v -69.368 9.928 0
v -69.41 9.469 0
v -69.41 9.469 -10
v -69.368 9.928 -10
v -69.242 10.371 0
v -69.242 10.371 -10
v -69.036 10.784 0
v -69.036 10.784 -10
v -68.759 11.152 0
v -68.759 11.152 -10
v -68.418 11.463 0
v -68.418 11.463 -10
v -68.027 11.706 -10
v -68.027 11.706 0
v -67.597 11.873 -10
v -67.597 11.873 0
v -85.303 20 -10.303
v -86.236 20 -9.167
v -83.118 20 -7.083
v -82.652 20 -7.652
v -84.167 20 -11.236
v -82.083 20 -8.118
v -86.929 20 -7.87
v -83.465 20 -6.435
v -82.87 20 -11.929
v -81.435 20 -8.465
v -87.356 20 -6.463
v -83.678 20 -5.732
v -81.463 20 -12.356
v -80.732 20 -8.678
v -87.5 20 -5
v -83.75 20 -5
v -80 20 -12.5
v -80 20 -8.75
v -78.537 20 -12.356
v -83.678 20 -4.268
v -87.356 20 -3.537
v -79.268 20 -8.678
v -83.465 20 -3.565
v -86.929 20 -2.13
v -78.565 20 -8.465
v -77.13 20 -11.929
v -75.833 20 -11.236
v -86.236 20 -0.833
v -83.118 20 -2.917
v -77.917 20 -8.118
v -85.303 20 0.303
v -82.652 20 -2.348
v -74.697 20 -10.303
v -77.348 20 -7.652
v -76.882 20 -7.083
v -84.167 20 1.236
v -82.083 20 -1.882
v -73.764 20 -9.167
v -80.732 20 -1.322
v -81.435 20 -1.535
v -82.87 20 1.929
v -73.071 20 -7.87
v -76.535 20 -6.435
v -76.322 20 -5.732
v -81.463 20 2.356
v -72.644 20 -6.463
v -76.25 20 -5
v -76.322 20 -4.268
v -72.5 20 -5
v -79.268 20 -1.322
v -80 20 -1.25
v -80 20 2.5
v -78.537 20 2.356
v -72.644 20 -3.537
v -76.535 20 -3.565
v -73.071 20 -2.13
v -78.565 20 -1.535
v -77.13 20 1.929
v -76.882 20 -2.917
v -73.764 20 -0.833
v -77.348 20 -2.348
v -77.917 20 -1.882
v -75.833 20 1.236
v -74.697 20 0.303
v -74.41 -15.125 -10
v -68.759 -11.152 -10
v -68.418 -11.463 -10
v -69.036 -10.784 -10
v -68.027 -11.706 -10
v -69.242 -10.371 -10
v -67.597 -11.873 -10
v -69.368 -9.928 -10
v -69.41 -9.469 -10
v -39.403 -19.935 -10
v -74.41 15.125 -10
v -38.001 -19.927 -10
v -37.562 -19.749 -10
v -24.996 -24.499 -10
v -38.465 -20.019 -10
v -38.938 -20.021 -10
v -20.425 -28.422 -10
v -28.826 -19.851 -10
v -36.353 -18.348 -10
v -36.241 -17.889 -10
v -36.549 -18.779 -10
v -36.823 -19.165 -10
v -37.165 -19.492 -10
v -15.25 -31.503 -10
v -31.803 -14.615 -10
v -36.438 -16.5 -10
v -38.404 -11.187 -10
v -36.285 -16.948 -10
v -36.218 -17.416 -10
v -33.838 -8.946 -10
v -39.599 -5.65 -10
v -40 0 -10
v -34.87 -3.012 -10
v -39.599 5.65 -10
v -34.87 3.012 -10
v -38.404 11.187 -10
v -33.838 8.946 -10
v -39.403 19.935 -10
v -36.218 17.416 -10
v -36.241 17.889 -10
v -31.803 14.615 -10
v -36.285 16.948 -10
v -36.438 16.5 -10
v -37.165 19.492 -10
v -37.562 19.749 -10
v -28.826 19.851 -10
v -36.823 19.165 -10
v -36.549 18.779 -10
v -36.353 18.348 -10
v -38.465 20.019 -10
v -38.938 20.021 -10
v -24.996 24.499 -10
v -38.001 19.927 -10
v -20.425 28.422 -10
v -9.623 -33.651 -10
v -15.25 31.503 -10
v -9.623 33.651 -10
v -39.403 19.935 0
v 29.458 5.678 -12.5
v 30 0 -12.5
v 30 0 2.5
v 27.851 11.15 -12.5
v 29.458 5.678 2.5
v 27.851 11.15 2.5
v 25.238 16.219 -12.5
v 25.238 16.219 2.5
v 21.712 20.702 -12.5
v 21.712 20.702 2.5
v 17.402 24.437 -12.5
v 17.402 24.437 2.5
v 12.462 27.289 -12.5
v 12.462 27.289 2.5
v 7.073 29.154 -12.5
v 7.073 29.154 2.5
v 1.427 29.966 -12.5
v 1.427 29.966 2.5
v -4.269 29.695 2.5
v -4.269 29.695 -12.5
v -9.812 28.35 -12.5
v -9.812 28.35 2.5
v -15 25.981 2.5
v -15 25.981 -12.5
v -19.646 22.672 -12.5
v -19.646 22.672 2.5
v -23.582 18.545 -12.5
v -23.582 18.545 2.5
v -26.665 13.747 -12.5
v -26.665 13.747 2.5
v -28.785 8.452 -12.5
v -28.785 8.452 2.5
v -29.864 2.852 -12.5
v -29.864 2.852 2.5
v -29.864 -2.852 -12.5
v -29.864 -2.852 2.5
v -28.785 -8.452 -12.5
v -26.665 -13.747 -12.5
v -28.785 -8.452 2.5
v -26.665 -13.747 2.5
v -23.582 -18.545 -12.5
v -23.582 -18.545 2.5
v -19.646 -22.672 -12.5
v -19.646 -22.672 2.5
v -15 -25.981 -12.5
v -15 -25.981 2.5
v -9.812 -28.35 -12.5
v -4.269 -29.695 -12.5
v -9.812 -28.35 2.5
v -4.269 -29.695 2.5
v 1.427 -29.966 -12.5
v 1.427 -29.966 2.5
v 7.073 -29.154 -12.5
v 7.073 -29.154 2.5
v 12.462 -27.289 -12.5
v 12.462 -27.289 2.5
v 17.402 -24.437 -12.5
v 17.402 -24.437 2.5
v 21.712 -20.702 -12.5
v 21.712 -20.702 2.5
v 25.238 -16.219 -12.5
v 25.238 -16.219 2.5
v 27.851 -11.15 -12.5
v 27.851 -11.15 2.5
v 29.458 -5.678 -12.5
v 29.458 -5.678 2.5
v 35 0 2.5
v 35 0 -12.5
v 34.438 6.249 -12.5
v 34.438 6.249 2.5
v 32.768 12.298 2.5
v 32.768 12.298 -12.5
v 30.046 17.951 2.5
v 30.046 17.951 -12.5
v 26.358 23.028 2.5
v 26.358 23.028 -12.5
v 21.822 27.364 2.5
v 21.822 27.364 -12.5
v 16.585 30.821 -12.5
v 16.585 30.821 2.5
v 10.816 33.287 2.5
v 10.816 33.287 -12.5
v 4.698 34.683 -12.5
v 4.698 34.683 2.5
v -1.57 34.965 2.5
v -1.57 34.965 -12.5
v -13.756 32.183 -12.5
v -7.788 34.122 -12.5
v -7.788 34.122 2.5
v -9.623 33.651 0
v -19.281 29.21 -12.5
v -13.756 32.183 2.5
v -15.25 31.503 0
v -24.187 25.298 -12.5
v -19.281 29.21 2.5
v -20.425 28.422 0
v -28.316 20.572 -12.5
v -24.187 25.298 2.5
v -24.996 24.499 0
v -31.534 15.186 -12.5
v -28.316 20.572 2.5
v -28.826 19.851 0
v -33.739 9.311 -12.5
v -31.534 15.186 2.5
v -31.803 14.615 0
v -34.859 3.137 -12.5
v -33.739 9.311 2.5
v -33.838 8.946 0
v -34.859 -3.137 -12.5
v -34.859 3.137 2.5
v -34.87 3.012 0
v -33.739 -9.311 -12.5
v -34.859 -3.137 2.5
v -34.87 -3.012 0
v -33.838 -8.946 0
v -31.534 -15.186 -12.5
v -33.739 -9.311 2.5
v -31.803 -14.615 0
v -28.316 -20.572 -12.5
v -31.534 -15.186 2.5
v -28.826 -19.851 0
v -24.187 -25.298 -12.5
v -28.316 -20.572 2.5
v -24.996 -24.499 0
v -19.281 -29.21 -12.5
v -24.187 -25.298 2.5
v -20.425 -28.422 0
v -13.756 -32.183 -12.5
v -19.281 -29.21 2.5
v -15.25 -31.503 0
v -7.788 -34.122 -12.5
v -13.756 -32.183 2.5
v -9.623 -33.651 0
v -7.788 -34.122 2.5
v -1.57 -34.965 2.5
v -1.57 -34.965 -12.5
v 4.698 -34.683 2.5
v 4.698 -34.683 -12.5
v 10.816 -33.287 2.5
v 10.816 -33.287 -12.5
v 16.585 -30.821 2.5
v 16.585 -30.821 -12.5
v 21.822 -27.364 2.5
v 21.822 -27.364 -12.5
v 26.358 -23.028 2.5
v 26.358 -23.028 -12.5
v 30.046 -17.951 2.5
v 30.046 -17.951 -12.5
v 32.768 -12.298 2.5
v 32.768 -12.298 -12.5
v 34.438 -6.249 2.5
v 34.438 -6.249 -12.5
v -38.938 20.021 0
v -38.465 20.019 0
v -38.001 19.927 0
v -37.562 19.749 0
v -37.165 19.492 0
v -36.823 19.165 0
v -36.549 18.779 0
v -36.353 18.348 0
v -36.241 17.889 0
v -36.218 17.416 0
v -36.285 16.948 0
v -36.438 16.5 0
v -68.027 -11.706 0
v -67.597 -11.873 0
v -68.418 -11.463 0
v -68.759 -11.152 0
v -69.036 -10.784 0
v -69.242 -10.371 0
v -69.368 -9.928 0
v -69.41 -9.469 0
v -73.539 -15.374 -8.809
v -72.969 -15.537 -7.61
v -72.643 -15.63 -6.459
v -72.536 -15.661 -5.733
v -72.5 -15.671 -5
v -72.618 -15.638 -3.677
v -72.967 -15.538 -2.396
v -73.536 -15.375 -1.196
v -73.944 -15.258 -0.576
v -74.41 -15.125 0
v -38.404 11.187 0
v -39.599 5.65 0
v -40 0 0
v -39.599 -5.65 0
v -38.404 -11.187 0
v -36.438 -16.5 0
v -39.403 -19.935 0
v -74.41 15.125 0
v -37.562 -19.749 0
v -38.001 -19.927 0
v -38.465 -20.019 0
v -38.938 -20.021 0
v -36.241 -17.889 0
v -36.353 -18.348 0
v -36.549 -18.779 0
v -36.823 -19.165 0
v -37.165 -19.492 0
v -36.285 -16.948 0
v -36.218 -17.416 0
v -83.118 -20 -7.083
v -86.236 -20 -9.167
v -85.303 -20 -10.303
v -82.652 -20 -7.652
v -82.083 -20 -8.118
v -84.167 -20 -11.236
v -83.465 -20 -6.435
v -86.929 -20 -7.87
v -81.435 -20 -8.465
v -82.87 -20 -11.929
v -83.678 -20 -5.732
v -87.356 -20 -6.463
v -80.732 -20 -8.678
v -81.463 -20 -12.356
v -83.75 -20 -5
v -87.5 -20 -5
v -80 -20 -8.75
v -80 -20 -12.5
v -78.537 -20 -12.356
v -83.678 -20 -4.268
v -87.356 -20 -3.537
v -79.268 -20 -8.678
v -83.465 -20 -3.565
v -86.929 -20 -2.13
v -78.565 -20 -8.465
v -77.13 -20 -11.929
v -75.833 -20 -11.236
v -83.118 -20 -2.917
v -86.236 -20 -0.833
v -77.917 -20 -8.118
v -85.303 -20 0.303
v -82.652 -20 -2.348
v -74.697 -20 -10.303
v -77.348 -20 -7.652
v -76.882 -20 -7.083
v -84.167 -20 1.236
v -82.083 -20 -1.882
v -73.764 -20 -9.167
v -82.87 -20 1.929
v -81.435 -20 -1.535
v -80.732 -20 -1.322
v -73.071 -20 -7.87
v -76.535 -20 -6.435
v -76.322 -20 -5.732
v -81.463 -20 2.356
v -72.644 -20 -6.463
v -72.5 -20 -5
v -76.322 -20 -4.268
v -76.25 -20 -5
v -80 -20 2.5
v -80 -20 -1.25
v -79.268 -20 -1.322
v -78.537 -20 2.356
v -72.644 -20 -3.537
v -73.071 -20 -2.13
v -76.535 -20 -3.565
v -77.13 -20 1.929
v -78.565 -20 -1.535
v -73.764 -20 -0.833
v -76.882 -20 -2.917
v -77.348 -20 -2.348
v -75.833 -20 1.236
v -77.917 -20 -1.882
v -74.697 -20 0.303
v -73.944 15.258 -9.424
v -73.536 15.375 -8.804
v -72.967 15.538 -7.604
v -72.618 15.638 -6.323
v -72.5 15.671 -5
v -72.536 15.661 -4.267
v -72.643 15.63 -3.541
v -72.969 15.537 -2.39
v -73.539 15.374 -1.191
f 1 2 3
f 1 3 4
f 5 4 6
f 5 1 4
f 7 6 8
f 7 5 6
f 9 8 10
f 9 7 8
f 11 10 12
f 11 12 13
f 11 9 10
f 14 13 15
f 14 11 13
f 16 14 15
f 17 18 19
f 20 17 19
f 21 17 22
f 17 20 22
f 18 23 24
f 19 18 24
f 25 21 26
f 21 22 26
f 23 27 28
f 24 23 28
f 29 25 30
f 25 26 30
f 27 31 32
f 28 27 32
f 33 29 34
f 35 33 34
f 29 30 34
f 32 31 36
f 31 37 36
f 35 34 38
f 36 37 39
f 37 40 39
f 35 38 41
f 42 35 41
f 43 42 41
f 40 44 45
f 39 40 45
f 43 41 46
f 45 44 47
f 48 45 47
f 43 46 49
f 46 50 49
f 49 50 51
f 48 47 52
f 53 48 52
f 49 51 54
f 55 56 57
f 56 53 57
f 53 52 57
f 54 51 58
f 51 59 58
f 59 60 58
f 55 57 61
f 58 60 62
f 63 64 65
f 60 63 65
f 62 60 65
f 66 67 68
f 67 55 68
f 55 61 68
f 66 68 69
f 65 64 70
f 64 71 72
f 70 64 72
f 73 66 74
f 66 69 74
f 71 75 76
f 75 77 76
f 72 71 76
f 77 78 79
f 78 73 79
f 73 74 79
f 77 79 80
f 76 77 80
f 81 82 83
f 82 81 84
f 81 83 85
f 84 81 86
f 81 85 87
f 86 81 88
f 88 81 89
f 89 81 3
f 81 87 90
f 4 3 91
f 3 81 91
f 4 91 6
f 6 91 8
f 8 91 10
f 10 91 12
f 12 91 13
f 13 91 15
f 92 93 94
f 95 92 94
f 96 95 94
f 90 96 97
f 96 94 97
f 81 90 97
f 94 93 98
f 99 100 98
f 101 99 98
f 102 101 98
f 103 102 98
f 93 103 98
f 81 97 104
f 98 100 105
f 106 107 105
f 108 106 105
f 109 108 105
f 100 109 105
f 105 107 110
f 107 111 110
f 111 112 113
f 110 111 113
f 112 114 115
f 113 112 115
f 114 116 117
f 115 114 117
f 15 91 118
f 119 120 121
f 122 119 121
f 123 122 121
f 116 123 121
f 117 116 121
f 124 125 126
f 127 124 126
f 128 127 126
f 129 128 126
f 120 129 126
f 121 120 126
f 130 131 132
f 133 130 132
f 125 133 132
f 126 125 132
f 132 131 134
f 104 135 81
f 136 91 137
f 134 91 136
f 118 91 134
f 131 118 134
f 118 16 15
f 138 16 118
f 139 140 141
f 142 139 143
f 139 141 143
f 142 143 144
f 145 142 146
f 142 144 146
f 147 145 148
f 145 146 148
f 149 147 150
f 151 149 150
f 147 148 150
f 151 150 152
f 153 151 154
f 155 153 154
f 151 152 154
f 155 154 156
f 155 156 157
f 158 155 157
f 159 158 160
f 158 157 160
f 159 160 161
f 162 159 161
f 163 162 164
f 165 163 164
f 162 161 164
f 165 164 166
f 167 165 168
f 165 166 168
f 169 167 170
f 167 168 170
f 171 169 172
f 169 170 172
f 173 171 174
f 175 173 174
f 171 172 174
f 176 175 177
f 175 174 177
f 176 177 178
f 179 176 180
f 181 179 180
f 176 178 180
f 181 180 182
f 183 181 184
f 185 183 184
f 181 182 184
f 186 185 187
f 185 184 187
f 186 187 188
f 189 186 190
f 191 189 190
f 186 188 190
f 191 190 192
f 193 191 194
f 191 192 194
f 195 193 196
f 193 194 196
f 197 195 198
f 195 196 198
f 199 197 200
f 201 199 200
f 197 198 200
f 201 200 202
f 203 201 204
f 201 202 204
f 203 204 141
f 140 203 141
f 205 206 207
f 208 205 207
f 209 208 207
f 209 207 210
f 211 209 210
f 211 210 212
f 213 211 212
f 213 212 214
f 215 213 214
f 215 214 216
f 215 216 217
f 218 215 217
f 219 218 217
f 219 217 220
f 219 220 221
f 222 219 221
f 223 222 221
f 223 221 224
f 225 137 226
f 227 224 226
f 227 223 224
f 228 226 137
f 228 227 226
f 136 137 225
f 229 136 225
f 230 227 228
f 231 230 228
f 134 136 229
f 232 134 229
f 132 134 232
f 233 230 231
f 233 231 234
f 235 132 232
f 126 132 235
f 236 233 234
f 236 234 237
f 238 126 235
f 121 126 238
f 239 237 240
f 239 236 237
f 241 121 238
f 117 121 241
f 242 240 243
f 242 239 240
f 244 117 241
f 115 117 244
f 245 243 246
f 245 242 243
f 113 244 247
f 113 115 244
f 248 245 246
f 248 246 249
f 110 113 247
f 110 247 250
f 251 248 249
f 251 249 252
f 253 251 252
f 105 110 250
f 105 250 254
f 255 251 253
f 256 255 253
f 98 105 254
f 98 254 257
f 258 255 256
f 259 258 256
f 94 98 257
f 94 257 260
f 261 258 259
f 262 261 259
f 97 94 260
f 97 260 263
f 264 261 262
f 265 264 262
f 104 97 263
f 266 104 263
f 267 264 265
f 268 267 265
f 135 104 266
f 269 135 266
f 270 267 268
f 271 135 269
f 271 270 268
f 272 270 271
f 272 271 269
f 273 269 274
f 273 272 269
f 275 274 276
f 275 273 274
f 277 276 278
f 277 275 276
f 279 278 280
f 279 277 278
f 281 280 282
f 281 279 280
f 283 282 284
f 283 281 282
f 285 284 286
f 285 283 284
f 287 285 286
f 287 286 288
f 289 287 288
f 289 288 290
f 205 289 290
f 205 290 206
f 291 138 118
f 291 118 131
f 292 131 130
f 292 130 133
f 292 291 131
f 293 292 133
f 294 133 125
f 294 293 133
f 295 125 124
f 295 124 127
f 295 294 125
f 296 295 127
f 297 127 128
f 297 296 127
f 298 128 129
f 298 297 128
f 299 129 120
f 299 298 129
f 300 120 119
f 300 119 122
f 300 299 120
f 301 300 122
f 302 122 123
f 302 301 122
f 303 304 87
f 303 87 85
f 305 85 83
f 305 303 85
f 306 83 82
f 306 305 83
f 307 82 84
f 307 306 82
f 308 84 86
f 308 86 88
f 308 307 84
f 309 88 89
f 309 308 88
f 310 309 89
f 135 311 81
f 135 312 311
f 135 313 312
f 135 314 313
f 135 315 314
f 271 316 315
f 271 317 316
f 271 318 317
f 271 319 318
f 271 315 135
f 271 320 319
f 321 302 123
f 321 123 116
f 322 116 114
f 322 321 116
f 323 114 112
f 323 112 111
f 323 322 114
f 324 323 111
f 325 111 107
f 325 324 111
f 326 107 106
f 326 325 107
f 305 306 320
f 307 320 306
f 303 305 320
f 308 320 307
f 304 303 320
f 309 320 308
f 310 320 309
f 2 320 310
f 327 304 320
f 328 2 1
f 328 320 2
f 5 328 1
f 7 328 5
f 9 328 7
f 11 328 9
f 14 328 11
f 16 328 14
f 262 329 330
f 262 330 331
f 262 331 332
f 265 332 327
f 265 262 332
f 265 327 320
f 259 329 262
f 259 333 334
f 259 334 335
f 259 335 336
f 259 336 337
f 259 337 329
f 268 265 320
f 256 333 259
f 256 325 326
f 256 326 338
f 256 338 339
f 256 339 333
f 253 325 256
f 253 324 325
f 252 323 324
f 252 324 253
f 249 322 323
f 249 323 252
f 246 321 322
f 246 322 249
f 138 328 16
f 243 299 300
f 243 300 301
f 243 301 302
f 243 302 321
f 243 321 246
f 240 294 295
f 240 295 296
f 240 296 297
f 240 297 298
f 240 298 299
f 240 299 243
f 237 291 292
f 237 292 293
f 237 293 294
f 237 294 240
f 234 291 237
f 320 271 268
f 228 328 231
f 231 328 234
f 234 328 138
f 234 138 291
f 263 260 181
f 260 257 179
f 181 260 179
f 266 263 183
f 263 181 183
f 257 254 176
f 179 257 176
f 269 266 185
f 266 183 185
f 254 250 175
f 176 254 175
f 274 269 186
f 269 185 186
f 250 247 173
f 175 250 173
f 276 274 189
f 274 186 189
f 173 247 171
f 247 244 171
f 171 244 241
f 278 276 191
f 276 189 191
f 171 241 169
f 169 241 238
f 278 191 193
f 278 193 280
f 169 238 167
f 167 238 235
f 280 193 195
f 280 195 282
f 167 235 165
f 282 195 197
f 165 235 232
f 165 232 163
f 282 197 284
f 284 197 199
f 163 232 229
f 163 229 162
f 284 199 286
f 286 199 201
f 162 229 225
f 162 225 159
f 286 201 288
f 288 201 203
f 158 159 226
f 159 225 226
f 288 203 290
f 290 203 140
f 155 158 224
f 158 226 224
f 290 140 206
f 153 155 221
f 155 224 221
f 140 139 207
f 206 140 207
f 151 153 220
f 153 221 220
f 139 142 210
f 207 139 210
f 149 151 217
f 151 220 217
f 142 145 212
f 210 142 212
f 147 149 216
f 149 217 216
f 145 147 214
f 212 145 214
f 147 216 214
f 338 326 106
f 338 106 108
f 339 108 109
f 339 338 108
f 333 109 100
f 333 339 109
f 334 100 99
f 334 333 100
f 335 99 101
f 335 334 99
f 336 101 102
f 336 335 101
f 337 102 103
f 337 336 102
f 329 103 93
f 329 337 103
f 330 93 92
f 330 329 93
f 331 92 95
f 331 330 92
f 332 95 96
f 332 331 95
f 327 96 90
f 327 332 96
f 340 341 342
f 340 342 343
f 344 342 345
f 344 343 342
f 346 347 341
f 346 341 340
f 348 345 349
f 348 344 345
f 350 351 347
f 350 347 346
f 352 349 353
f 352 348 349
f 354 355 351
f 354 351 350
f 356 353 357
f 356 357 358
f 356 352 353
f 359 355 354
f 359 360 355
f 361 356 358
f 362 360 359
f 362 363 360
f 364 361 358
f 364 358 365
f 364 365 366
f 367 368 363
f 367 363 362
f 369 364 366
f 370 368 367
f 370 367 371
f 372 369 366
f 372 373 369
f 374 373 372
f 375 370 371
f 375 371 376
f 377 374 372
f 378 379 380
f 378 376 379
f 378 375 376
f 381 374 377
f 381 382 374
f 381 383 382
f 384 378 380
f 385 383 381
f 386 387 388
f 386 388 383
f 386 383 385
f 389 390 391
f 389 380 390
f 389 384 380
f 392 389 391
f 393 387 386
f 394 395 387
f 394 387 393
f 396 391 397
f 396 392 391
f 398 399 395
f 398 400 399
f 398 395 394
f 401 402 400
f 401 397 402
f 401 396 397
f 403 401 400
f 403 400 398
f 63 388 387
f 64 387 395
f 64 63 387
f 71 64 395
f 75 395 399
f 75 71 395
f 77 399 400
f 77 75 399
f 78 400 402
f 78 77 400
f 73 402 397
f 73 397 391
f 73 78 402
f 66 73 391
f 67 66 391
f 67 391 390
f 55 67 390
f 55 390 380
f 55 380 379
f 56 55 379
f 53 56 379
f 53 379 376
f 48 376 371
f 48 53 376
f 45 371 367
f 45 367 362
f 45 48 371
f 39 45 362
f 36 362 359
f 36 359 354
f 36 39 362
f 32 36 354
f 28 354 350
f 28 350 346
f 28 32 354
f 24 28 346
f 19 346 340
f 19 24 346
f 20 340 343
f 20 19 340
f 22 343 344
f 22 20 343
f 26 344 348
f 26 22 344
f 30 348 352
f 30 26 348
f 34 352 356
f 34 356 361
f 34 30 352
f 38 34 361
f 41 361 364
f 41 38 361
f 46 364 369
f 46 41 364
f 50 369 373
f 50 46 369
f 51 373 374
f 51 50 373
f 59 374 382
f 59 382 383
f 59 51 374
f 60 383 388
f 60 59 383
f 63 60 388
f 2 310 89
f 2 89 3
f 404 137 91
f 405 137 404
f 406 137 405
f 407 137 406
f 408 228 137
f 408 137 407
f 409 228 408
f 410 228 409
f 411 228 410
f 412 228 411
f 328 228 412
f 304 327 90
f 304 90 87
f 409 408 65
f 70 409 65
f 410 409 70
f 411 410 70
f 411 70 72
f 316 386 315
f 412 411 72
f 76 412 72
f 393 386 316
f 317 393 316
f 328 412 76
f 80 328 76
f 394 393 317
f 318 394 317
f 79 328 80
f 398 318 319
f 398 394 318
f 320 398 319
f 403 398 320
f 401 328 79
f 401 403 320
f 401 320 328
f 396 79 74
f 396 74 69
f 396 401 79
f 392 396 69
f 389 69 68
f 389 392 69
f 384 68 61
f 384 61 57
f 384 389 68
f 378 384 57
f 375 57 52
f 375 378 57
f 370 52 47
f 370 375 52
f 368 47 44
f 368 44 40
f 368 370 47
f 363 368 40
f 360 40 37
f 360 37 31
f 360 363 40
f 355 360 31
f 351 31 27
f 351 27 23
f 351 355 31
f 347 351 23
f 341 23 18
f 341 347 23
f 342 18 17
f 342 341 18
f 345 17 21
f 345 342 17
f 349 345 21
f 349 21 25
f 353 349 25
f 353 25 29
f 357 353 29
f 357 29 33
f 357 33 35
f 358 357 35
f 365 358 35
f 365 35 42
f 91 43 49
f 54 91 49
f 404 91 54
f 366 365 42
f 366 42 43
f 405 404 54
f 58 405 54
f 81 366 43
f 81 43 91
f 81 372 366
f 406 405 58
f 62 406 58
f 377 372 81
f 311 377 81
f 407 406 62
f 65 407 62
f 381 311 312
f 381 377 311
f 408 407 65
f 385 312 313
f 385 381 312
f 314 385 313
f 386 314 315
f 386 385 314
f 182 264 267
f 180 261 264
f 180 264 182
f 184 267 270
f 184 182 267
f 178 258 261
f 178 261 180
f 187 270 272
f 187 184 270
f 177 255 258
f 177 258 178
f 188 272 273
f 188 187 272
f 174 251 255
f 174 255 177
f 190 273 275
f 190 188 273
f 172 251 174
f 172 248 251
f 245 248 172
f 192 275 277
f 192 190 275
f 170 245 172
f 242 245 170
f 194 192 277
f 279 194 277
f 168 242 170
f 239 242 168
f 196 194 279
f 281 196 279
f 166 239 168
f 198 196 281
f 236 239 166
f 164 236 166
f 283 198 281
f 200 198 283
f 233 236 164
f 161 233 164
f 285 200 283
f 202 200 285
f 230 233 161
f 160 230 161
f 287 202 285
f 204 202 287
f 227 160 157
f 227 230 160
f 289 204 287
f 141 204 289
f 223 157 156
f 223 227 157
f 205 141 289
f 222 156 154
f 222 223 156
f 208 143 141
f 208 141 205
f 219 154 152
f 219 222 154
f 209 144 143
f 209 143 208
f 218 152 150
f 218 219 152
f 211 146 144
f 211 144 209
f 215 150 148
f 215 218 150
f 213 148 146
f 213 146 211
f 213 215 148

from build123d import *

# Parameters (mm, degrees)
F2_R     = 35
F2_R_2   = 29.9999993294
F3_DEPTH = 15
F4_R     = 7.5
F4_R_2   = 3.75
F5_DEPTH = 20
F6_DEPTH = 10


with BuildPart() as f3:
    # F2 (on offset) → F3 (new body)
    with BuildSketch(Plane.XY.offset(2.5)):
        Circle(F2_R)
        Circle(F2_R_2, mode=Mode.SUBTRACT)
    extrude(amount=-F3_DEPTH)



with BuildPart() as f5:
    # F4 (on Front) → F5 (new body, symmetric)
    with BuildSketch(Plane.XZ):
        with Locations((-80, -5)):
            Circle(F4_R)
        with Locations((-80, -5)):
            Circle(F4_R_2, mode=Mode.SUBTRACT)
    extrude(amount=F5_DEPTH, both=True)


with BuildPart() as f3_1:
    add(f3.part)

    add(f5.part)  # F6 merges F5
    # F0 (on Top) → F6 (join)
    with BuildSketch(Plane.XY):
        with BuildLine():
            ThreePointArc((-9.6227058053, -33.6512040347), (-35, 0), (-9.6227058053, 33.6512040347))
            Line((-9.6227058053, 33.6512040347), (-74.41, 15.125))
            Line((-74.41, 15.125), (-74.41, -15.125))
            Line((-74.41, -15.125), (-9.6227058053, -33.6512040347))
        make_face()
        with BuildLine():
            ThreePointArc((-39.4029946243, 19.9349947238), (-36.8231138473, 19.164822755), (-36.4382668191, 16.5000821579))
            ThreePointArc((-36.4382668191, 16.5000821579), (-40, 0), (-36.4382668191, -16.5000821579))
            ThreePointArc((-36.4382668191, -16.5000821579), (-36.8231138473, -19.164822755), (-39.4029946243, -19.9349947238))
            Line((-39.4029946243, -19.9349947238), (-67.597336129, -11.8727021118))
            ThreePointArc((-67.597336129, -11.8727021118), (-68.9060386172, -10.9743120453), (-69.41, -9.4690446807))
            Line((-69.41, -9.4690446807), (-69.41, 9.4690446807))
            ThreePointArc((-69.41, 9.4690446807), (-68.9060386172, 10.9743120453), (-67.597336129, 11.8727021118))
            Line((-67.597336129, 11.8727021118), (-39.4029946243, 19.9349947238))
        make_face(mode=Mode.SUBTRACT)
    extrude(amount=-F6_DEPTH)


solid = f3_1.part
